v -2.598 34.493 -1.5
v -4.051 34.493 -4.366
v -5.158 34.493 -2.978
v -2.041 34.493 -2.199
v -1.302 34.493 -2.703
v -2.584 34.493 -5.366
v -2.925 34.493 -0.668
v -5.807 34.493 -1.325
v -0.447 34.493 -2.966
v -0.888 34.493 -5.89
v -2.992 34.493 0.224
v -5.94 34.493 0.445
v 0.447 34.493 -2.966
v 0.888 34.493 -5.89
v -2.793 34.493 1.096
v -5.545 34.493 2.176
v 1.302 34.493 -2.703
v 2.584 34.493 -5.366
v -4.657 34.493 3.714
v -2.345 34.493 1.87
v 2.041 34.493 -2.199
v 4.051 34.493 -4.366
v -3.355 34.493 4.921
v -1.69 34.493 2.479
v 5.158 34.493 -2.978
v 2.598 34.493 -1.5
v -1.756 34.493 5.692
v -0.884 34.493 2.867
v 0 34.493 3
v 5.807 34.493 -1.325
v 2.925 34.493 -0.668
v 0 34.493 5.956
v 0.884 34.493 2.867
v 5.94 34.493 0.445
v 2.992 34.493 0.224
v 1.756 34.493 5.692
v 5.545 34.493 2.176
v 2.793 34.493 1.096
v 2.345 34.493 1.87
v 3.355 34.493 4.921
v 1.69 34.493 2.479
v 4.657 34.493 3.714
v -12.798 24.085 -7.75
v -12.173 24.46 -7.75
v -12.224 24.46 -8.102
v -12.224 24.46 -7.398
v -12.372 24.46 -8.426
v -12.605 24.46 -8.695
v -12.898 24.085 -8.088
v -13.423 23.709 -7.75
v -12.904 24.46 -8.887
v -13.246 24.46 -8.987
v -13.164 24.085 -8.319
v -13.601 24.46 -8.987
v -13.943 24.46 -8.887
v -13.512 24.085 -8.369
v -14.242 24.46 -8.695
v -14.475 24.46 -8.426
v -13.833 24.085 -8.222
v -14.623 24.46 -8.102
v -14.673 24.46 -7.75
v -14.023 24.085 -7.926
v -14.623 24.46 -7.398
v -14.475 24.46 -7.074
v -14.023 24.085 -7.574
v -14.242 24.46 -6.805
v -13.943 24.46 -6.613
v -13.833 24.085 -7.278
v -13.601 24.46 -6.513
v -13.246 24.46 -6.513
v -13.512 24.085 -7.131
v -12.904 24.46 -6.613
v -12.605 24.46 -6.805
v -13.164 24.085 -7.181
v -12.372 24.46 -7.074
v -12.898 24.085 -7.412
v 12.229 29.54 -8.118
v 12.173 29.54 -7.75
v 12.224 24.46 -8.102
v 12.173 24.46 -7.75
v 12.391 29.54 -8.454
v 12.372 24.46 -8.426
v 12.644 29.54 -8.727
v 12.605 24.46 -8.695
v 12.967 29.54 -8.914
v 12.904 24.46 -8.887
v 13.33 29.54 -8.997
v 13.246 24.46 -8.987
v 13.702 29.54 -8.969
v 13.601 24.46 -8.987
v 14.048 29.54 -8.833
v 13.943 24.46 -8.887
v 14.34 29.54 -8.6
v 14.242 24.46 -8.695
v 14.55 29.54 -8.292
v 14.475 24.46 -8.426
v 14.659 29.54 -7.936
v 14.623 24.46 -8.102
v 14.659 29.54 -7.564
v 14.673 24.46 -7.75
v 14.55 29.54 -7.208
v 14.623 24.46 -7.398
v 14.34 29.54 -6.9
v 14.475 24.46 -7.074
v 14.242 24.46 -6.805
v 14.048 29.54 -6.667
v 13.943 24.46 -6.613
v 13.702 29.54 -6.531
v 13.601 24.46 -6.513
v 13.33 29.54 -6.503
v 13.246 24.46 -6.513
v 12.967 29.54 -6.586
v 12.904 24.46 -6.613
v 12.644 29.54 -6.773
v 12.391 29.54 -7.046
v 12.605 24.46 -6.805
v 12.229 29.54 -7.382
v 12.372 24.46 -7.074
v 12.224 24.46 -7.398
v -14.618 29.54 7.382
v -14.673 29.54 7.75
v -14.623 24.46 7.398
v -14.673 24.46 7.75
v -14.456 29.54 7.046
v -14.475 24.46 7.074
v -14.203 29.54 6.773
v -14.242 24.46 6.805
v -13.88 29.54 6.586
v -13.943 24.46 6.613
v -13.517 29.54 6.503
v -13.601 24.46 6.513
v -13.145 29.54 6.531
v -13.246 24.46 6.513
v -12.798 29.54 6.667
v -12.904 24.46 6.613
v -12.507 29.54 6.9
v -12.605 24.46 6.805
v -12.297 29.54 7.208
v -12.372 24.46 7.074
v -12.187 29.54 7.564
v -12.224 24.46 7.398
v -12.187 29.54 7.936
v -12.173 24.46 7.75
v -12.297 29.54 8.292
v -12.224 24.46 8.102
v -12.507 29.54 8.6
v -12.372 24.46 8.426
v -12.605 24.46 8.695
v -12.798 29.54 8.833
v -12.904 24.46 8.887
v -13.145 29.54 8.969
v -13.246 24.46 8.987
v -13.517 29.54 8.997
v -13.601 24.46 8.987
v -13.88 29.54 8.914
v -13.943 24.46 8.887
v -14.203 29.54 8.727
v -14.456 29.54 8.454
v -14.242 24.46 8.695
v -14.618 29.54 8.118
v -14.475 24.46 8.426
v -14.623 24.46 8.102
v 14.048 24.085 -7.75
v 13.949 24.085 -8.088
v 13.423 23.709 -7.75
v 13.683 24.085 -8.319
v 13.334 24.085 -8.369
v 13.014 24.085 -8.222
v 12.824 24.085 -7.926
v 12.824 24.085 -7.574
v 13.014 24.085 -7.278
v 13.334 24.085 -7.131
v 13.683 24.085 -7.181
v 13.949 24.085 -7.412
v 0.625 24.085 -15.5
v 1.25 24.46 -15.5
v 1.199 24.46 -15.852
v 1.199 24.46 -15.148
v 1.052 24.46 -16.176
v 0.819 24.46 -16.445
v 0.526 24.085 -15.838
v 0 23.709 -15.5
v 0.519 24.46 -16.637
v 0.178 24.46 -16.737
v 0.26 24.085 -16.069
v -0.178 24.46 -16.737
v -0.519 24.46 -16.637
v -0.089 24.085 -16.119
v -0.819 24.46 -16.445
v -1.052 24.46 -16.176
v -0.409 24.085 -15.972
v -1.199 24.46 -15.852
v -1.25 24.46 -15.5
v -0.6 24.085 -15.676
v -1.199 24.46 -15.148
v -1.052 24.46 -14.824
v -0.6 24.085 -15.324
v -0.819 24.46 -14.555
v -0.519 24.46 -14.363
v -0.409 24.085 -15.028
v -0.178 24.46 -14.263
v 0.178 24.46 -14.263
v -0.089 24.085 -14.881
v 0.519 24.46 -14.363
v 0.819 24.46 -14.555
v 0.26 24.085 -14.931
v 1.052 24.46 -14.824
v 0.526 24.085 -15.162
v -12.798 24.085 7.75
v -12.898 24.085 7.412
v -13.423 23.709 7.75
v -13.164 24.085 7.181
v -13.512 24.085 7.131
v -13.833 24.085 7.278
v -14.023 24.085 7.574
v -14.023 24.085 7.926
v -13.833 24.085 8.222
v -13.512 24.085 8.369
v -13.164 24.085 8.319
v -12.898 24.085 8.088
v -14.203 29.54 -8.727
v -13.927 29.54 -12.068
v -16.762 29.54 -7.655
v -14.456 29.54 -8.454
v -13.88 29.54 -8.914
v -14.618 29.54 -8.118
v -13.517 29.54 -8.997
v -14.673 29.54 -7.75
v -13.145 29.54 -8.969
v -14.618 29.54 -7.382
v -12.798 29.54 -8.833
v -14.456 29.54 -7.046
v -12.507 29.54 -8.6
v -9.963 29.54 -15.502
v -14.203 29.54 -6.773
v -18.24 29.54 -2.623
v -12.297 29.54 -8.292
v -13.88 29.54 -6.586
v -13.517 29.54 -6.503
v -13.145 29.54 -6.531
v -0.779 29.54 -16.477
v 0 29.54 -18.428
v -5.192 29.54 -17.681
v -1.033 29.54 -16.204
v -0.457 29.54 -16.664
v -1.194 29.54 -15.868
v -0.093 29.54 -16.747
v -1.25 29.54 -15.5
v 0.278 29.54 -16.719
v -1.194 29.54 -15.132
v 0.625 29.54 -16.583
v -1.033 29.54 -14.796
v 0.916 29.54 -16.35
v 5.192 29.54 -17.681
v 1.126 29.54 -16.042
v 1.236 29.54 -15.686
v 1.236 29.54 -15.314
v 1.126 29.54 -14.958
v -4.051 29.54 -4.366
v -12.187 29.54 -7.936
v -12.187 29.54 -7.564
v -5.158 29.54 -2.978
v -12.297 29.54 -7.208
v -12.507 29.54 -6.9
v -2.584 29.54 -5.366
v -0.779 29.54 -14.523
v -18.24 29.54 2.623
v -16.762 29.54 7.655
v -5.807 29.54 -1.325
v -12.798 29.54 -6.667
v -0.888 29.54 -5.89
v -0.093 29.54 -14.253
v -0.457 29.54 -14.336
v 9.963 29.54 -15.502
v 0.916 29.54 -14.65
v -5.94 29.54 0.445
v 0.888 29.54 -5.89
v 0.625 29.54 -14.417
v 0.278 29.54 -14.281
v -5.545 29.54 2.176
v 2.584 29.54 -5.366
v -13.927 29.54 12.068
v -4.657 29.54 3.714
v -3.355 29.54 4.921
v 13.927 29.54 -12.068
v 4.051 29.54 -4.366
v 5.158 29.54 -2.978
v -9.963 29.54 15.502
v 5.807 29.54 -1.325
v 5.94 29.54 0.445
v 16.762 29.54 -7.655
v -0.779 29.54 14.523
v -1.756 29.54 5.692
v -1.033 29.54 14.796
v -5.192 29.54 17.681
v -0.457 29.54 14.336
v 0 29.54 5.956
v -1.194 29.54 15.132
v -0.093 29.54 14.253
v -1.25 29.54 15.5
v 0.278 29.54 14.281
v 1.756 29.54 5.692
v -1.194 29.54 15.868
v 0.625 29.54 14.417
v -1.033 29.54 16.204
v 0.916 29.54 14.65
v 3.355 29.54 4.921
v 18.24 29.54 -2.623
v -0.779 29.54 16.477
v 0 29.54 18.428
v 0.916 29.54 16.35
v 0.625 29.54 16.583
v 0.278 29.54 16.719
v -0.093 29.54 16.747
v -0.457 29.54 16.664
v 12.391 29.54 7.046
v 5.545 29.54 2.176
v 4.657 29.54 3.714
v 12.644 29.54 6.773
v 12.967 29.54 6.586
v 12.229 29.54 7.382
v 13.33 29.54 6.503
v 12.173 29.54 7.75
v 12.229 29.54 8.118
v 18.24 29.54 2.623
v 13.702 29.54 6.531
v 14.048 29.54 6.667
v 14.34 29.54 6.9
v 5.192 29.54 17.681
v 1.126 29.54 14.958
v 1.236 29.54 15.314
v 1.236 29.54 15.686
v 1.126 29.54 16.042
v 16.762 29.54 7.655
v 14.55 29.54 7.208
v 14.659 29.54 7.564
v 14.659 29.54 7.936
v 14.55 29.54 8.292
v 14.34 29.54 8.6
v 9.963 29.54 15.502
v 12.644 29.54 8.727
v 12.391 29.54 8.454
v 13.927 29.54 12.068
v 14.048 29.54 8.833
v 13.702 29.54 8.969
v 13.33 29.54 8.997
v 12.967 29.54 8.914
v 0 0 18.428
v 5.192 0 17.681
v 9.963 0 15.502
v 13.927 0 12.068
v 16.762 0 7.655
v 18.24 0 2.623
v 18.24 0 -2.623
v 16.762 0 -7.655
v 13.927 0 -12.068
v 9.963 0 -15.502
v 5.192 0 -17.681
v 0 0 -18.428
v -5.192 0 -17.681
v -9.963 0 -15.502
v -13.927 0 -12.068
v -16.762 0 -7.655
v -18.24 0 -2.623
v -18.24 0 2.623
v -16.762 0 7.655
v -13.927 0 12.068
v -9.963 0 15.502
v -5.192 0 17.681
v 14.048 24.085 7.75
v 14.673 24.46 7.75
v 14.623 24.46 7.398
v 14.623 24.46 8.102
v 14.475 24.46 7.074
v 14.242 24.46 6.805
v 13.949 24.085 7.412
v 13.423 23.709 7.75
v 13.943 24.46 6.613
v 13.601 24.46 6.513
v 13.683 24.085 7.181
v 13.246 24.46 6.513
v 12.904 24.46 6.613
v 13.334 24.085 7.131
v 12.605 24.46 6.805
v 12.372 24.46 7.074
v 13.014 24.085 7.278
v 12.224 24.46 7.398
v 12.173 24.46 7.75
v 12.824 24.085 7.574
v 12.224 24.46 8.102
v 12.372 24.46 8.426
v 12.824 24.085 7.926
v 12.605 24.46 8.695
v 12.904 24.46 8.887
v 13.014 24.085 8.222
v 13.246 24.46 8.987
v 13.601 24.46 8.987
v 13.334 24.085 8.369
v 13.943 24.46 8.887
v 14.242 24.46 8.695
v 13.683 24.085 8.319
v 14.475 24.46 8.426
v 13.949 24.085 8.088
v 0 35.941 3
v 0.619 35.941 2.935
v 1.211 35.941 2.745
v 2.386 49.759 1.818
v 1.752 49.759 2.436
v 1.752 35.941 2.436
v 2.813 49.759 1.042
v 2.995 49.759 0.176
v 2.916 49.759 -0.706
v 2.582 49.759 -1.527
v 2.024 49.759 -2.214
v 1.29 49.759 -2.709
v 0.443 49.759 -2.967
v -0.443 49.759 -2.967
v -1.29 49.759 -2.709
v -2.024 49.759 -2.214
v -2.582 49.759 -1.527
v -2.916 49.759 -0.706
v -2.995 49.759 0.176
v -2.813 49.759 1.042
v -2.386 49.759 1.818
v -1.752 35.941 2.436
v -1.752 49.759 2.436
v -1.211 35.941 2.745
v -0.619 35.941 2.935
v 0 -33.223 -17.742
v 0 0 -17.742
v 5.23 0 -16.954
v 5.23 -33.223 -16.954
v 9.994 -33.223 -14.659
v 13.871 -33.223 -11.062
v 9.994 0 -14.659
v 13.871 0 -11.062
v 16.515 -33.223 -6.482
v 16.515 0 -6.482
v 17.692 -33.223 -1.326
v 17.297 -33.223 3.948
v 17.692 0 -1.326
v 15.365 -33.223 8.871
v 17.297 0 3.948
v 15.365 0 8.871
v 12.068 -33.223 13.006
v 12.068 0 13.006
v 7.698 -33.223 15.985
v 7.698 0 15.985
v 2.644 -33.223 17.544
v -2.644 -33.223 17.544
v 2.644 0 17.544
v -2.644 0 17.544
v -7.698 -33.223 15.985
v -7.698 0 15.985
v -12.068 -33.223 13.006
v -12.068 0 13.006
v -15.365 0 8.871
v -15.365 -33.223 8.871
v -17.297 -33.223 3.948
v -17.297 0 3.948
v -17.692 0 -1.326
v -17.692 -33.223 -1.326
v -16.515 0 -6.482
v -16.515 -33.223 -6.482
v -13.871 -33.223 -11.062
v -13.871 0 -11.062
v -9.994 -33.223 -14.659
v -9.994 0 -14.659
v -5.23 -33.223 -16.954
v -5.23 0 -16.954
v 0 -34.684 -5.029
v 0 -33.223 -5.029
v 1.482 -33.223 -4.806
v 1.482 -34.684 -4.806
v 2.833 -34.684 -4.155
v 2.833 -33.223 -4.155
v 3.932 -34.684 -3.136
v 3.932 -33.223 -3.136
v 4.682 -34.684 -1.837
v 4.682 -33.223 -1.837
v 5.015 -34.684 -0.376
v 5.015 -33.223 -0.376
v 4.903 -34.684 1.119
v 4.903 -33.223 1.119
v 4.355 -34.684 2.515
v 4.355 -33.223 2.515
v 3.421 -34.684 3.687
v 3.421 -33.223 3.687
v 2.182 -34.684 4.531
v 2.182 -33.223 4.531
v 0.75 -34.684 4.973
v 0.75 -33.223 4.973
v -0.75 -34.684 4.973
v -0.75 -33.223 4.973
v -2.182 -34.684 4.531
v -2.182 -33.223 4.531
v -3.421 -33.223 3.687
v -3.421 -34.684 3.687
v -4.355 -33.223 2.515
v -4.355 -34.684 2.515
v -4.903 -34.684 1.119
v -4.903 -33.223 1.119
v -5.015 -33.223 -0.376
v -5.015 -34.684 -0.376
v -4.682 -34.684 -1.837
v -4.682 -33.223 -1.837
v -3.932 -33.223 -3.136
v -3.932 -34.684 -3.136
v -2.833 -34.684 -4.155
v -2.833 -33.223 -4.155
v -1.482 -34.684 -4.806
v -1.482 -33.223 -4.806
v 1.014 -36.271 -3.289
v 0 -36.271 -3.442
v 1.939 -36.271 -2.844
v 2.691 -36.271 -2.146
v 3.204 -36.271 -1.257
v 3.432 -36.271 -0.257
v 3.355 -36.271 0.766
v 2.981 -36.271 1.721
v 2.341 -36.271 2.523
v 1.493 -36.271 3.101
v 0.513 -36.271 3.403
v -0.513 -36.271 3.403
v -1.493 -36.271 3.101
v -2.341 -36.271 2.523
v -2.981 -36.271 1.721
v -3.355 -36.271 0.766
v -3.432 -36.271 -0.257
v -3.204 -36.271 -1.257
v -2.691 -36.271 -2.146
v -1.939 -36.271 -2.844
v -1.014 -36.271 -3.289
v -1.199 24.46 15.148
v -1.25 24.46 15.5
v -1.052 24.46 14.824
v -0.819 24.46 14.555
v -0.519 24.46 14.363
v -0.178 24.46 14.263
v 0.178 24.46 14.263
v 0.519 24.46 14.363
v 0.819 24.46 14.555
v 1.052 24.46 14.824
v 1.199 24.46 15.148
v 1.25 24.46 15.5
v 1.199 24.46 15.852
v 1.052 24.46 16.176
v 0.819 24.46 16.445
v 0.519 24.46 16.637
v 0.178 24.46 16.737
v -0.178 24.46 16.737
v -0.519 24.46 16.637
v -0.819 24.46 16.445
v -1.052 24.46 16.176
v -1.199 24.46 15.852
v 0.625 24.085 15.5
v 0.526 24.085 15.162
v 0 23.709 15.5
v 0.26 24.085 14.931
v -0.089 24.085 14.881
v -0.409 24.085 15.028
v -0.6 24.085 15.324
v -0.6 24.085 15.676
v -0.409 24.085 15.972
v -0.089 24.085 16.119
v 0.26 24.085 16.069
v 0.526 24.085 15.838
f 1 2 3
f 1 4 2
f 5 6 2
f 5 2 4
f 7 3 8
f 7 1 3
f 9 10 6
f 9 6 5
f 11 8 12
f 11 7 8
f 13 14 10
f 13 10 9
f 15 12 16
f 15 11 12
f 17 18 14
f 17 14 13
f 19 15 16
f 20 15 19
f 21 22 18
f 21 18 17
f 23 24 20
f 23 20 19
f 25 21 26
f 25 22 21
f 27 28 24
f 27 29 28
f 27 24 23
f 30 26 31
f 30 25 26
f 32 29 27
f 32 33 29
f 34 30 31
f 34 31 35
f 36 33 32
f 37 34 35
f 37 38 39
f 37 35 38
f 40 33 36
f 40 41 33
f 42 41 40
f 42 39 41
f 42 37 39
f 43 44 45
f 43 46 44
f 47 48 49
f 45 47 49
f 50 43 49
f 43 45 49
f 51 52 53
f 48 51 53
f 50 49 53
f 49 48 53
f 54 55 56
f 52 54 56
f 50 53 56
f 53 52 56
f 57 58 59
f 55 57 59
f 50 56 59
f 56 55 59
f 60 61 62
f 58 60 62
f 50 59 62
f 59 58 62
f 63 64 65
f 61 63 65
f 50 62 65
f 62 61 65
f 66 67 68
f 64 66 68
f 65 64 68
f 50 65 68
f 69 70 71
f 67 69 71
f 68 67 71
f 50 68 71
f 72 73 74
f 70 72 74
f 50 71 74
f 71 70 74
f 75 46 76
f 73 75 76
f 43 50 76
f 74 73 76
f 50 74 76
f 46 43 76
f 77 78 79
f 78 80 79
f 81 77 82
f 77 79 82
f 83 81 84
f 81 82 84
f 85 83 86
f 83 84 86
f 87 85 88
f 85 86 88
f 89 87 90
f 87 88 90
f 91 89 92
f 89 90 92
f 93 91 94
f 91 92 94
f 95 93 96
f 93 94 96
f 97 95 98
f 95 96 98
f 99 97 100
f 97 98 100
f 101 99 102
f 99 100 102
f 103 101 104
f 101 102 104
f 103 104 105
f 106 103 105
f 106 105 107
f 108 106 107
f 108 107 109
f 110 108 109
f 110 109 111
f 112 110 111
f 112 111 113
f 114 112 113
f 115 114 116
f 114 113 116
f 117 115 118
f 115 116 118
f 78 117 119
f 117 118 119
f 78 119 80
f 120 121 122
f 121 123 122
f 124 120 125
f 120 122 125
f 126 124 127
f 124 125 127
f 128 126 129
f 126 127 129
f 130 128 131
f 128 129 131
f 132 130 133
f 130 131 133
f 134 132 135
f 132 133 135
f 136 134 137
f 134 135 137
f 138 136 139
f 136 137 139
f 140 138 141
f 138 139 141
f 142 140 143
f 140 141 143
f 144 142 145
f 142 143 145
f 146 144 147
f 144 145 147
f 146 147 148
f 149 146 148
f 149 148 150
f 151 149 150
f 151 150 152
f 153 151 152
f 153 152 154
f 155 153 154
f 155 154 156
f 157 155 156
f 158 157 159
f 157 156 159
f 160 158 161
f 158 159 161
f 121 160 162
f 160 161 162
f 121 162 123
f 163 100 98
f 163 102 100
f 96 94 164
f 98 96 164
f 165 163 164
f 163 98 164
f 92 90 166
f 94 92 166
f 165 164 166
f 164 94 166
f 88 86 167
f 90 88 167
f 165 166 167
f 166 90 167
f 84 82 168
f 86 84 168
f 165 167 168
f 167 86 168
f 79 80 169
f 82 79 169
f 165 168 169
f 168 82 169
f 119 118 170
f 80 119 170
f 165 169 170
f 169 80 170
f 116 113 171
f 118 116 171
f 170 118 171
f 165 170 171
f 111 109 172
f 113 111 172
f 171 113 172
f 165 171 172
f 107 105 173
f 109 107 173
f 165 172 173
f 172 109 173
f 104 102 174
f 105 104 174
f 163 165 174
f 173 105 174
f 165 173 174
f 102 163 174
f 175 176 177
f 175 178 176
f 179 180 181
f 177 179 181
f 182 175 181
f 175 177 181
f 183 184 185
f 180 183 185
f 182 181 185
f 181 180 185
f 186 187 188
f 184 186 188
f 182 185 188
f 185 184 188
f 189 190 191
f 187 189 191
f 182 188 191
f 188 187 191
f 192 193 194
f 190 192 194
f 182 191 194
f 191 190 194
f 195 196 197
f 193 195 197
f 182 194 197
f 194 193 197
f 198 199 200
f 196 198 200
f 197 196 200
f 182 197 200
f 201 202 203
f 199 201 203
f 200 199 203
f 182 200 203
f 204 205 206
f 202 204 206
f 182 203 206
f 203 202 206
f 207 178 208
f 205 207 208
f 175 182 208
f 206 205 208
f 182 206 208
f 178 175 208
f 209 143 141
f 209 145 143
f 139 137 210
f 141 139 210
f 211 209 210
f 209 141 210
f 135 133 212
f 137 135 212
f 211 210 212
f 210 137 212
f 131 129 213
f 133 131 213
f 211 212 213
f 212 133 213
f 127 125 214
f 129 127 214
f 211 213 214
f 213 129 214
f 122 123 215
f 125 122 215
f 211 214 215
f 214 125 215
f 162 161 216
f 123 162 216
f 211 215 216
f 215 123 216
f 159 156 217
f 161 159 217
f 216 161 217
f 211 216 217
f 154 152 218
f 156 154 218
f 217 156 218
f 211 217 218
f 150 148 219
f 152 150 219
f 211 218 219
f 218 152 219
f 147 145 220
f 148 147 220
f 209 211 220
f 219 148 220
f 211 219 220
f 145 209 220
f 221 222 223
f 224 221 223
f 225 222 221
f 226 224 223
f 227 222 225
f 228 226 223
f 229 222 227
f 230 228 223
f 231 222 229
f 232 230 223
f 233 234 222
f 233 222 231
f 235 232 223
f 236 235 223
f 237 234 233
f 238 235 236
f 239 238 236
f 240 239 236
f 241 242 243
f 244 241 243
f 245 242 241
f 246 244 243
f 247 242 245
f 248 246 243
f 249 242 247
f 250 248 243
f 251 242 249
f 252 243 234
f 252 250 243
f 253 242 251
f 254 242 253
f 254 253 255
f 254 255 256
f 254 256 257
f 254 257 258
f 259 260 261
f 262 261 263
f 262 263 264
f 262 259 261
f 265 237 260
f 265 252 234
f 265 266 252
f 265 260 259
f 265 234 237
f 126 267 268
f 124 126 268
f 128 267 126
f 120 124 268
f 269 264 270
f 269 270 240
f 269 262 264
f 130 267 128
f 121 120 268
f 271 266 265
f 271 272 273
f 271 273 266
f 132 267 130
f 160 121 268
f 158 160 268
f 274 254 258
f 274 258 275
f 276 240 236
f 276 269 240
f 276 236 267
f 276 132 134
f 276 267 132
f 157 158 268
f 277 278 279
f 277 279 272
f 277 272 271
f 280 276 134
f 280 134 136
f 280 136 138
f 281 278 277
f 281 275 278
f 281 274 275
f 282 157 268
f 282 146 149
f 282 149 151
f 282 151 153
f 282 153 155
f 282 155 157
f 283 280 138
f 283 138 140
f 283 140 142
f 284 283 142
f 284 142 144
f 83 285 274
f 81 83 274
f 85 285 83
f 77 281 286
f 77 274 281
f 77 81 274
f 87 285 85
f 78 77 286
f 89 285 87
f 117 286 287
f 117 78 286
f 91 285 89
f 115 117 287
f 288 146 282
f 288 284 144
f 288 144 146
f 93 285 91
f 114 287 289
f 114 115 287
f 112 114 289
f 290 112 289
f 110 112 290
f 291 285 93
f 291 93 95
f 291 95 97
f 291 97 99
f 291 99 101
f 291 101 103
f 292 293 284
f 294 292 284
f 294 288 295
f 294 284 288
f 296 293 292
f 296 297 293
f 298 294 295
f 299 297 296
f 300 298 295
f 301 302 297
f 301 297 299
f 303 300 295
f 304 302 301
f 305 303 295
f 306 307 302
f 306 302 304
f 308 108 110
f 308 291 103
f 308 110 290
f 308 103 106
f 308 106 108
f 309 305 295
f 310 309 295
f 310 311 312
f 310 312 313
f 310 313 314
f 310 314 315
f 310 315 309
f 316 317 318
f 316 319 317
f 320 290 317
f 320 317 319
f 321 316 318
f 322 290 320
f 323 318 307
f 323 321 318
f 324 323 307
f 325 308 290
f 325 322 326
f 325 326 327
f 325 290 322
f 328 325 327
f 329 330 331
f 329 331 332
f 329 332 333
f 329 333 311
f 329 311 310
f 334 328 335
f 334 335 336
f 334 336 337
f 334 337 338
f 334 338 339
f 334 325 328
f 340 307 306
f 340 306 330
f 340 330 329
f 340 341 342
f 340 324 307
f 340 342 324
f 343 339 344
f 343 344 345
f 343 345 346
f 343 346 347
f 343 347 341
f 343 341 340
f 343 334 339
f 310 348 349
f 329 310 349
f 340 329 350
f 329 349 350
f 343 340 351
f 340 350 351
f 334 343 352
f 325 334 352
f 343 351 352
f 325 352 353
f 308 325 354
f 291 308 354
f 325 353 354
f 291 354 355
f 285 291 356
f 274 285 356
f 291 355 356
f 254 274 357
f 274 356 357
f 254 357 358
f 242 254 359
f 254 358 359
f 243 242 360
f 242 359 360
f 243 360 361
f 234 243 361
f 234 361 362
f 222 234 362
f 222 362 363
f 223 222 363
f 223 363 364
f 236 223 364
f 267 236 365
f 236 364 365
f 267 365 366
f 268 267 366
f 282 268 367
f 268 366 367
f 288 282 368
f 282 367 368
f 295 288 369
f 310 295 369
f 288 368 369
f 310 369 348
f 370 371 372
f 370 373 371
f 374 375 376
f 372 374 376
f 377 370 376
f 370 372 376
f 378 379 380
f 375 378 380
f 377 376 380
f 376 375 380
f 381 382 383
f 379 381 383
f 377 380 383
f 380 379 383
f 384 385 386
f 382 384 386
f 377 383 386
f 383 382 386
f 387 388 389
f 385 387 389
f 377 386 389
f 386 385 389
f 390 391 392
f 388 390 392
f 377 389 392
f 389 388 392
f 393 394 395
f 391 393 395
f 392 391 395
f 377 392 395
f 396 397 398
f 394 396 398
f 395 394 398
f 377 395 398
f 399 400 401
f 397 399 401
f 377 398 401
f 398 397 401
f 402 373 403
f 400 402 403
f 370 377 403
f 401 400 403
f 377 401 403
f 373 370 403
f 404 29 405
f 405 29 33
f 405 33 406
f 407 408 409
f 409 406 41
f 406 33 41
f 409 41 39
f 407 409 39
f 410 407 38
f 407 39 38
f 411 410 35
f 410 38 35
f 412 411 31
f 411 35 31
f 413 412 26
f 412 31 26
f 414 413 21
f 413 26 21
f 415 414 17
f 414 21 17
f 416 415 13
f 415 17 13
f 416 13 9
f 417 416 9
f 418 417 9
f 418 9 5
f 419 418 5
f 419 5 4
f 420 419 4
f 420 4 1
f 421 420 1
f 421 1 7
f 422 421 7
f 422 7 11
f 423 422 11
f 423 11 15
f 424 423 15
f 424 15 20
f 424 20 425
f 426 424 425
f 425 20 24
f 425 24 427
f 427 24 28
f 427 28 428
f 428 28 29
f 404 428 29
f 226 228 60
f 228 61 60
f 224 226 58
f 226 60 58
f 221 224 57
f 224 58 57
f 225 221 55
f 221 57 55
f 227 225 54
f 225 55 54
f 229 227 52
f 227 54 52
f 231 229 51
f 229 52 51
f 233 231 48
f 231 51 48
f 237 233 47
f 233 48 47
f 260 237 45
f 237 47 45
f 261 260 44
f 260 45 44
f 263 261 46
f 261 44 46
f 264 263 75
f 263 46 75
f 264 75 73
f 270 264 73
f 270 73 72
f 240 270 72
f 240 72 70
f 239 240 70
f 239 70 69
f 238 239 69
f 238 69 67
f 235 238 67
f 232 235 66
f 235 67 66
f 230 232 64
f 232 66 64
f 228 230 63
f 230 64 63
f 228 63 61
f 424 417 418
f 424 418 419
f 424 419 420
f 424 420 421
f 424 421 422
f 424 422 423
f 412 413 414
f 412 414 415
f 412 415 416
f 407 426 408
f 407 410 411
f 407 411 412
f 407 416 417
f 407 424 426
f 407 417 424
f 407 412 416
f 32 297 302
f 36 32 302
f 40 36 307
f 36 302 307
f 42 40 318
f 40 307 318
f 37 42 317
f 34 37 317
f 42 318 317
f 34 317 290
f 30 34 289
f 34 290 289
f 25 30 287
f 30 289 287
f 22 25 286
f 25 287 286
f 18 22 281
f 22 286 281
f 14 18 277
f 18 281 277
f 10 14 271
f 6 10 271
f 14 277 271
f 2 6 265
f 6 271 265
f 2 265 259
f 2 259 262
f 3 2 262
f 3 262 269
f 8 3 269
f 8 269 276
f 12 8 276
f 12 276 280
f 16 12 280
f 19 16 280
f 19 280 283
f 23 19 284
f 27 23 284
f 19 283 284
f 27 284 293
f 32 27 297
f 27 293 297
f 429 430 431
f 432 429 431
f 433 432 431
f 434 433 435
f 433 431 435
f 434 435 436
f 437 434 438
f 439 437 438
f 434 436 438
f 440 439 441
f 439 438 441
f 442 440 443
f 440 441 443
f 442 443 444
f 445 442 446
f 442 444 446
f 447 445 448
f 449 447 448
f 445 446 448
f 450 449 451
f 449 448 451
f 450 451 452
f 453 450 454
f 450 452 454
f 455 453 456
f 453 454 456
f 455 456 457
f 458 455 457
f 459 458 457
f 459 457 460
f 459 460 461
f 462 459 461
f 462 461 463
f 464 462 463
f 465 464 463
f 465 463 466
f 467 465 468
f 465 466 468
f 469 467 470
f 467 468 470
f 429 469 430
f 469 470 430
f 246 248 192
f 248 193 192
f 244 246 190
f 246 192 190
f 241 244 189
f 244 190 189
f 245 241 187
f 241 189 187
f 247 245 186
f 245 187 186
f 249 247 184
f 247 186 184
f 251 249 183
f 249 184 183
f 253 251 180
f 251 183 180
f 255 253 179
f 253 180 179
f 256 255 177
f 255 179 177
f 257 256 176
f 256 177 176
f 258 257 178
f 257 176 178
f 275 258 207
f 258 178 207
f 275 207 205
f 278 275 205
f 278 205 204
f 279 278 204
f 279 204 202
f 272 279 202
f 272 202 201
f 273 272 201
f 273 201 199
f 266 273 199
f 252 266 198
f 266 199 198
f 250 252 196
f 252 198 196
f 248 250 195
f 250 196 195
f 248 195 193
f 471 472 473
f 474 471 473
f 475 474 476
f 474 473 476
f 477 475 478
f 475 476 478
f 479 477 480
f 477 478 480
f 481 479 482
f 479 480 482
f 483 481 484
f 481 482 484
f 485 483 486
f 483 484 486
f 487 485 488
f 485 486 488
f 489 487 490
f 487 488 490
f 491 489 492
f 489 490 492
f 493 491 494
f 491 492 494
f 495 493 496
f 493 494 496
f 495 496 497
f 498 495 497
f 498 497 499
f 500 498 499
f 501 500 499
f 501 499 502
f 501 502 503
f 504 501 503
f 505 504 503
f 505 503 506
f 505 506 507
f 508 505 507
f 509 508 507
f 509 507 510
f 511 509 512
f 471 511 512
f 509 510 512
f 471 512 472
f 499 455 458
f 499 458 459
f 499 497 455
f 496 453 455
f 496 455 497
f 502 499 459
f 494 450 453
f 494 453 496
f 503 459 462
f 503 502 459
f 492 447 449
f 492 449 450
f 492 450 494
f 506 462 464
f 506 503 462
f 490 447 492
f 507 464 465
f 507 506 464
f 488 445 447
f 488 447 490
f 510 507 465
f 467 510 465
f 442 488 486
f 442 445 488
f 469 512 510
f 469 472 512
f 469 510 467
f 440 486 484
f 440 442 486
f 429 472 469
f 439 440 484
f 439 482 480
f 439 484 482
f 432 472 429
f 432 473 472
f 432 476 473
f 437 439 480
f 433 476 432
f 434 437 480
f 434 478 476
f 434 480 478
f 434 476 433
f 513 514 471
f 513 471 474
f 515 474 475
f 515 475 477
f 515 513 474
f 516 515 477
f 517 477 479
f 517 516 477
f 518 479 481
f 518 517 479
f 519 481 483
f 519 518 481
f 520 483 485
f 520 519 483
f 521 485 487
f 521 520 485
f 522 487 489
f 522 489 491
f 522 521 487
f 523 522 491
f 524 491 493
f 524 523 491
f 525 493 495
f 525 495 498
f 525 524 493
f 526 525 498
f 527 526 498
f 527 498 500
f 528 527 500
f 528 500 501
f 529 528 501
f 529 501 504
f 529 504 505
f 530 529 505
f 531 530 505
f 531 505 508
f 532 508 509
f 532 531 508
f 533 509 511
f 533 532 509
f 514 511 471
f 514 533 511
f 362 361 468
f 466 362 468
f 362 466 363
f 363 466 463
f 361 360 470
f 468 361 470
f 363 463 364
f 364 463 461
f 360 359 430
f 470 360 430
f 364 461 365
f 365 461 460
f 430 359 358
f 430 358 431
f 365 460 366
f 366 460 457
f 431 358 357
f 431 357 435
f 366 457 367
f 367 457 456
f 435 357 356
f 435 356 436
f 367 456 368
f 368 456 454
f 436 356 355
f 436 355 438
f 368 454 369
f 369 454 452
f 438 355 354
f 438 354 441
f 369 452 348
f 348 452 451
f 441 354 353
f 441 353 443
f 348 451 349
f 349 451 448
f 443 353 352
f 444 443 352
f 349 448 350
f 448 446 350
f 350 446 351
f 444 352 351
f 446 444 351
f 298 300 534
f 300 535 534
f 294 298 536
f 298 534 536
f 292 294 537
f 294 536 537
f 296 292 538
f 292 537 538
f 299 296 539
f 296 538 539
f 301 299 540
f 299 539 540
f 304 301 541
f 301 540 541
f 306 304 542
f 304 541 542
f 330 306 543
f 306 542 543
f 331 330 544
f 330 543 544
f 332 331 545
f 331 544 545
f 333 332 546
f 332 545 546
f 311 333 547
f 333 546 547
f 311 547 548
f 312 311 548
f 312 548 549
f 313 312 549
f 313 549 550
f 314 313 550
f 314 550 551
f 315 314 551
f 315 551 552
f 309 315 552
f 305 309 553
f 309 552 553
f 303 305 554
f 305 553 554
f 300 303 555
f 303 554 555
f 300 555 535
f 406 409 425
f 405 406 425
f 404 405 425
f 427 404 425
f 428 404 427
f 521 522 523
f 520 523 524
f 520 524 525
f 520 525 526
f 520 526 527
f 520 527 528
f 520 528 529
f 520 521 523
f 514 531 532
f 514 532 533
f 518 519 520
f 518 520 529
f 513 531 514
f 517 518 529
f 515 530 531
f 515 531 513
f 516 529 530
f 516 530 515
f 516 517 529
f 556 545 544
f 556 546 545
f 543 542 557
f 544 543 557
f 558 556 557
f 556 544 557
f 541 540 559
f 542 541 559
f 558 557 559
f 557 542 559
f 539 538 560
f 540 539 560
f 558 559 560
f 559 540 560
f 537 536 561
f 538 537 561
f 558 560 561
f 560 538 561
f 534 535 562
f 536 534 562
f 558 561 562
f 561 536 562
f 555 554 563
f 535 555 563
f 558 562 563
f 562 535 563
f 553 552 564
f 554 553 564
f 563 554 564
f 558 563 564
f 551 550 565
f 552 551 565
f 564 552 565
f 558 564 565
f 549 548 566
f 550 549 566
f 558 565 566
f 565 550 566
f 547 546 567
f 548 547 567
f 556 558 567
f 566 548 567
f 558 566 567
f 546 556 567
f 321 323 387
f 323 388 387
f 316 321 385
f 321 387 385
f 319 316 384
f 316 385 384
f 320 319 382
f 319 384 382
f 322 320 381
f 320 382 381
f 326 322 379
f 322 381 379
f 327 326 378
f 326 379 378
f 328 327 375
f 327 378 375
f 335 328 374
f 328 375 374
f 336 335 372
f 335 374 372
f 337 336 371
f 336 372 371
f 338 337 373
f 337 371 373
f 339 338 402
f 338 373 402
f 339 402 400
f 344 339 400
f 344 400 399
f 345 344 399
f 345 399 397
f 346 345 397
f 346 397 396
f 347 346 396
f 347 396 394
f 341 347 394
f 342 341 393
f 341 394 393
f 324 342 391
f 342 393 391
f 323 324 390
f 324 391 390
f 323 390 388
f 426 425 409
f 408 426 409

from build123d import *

# Parameters (mm, degrees)
SKETCH1_R                       = 18.4277
BOSS_EXTRUDE1_DEPTH             = 29.5402
SKETCH2_R                       = 5.9563
BOSS_EXTRUDE2_DEPTH             = 4.953
SKETCH3_R                       = 3
BOSS_EXTRUDE3_DEPTH             = 15.2654
CUT_EXTRUDE1_DEPTH              = 13.8176
SKETCH5_R                       = 17.7419
BOSS_EXTRUDE4_DEPTH             = 33.2232
SKETCH6_R                       = 5.0292
BOSS_EXTRUDE5_DEPTH             = 3.048
CHAMFER1_SIZE                   = 1.5875
TAP_DRILL_FOR_M3X0_5_TAP1_D     = 2.5
TAP_DRILL_FOR_M3X0_5_TAP1_DEPTH = 5.08
TAP_DRILL_FOR_M3X0_5_TAP1_TIP   = 0.751075774


with BuildPart() as part:
    # Sketch1 → Boss-Extrude1 (new body)
    with BuildSketch(Plane(origin=(0, 0, 0), x_dir=(1, 0, 0), z_dir=(0, 1, 0))):
        with Locations(Location((0, 0, 0), (0, 0, 270))):
            Circle(SKETCH1_R)
    extrude(amount=BOSS_EXTRUDE1_DEPTH)

    # Sketch2 → Boss-Extrude2 (add)
    with BuildSketch(Plane(origin=(0, 29.5402, 0), x_dir=(1, 0, 0), z_dir=(0, 1, 0))):
        with Locations(Location((0, 0, 0), (0, 0, 270))):
            Circle(SKETCH2_R)
    extrude(amount=BOSS_EXTRUDE2_DEPTH)

    # Sketch3 → Boss-Extrude3 (add)
    with BuildSketch(Plane(origin=(0, 34.4932, 0), x_dir=(1, 0, 0), z_dir=(0, 1, 0))):
        with Locations(Location((0, 0, 0), (0, 0, 270))):
            Circle(SKETCH3_R)
    extrude(amount=BOSS_EXTRUDE3_DEPTH)

    # Sketch4 → Cut-Extrude1 (cut)
    with BuildSketch(Plane(origin=(0, 49.7586, 0), x_dir=(1, 0, 0), z_dir=(0, 1, 0))):
        with BuildLine():
            Line((-1.75155103, -2.435592791), (1.75155103, -2.435592791))
            ThreePointArc((1.75155103, -2.435592791), (0, -3.000007209), (-1.75155103, -2.435592791))
        make_face()
    extrude(amount=-CUT_EXTRUDE1_DEPTH, mode=Mode.SUBTRACT)

    # Sketch5 → Boss-Extrude4 (add)
    with BuildSketch(Plane.XZ):
        with Locations(Location((0, 0, 0), (0, 0, 270))):
            Circle(SKETCH5_R)
    extrude(amount=BOSS_EXTRUDE4_DEPTH)

    # Sketch6 → Boss-Extrude5 (add)
    with BuildSketch(Plane(origin=(0, -33.2232, 0), x_dir=(-1, 0, 0), z_dir=(0, -1, 0))):
        with Locations(Location((0, 0, 0), (0, 0, 90))):
            Circle(SKETCH6_R)
    extrude(amount=BOSS_EXTRUDE5_DEPTH)

    # Chamfer1
    chamfer1_edges = [part.edges().sort_by_distance(p)[0] for p in [
        (0, -36.2712, 5.0292),
    ]]
    chamfer(chamfer1_edges, length=CHAMFER1_SIZE)

    # Tap Drill for M3x0.5 Tap1
    with Locations(Plane(origin=(0, 29.5402, 0), x_dir=(1, 0, 0), z_dir=(0, 1, 0))):
        with Locations((0, 15.5), (13.423393759, 7.75), (13.423393759, -7.75), (0, -15.5), (-13.423393759, -7.75), (-13.423393759, 7.75)):
            Hole(TAP_DRILL_FOR_M3X0_5_TAP1_D / 2, depth=TAP_DRILL_FOR_M3X0_5_TAP1_DEPTH)
            with Locations((0, 0, -(TAP_DRILL_FOR_M3X0_5_TAP1_DEPTH + TAP_DRILL_FOR_M3X0_5_TAP1_TIP / 2))):  # 118° drill point
                Cone(0, TAP_DRILL_FOR_M3X0_5_TAP1_D / 2, TAP_DRILL_FOR_M3X0_5_TAP1_TIP, mode=Mode.SUBTRACT)


solid = part.part
